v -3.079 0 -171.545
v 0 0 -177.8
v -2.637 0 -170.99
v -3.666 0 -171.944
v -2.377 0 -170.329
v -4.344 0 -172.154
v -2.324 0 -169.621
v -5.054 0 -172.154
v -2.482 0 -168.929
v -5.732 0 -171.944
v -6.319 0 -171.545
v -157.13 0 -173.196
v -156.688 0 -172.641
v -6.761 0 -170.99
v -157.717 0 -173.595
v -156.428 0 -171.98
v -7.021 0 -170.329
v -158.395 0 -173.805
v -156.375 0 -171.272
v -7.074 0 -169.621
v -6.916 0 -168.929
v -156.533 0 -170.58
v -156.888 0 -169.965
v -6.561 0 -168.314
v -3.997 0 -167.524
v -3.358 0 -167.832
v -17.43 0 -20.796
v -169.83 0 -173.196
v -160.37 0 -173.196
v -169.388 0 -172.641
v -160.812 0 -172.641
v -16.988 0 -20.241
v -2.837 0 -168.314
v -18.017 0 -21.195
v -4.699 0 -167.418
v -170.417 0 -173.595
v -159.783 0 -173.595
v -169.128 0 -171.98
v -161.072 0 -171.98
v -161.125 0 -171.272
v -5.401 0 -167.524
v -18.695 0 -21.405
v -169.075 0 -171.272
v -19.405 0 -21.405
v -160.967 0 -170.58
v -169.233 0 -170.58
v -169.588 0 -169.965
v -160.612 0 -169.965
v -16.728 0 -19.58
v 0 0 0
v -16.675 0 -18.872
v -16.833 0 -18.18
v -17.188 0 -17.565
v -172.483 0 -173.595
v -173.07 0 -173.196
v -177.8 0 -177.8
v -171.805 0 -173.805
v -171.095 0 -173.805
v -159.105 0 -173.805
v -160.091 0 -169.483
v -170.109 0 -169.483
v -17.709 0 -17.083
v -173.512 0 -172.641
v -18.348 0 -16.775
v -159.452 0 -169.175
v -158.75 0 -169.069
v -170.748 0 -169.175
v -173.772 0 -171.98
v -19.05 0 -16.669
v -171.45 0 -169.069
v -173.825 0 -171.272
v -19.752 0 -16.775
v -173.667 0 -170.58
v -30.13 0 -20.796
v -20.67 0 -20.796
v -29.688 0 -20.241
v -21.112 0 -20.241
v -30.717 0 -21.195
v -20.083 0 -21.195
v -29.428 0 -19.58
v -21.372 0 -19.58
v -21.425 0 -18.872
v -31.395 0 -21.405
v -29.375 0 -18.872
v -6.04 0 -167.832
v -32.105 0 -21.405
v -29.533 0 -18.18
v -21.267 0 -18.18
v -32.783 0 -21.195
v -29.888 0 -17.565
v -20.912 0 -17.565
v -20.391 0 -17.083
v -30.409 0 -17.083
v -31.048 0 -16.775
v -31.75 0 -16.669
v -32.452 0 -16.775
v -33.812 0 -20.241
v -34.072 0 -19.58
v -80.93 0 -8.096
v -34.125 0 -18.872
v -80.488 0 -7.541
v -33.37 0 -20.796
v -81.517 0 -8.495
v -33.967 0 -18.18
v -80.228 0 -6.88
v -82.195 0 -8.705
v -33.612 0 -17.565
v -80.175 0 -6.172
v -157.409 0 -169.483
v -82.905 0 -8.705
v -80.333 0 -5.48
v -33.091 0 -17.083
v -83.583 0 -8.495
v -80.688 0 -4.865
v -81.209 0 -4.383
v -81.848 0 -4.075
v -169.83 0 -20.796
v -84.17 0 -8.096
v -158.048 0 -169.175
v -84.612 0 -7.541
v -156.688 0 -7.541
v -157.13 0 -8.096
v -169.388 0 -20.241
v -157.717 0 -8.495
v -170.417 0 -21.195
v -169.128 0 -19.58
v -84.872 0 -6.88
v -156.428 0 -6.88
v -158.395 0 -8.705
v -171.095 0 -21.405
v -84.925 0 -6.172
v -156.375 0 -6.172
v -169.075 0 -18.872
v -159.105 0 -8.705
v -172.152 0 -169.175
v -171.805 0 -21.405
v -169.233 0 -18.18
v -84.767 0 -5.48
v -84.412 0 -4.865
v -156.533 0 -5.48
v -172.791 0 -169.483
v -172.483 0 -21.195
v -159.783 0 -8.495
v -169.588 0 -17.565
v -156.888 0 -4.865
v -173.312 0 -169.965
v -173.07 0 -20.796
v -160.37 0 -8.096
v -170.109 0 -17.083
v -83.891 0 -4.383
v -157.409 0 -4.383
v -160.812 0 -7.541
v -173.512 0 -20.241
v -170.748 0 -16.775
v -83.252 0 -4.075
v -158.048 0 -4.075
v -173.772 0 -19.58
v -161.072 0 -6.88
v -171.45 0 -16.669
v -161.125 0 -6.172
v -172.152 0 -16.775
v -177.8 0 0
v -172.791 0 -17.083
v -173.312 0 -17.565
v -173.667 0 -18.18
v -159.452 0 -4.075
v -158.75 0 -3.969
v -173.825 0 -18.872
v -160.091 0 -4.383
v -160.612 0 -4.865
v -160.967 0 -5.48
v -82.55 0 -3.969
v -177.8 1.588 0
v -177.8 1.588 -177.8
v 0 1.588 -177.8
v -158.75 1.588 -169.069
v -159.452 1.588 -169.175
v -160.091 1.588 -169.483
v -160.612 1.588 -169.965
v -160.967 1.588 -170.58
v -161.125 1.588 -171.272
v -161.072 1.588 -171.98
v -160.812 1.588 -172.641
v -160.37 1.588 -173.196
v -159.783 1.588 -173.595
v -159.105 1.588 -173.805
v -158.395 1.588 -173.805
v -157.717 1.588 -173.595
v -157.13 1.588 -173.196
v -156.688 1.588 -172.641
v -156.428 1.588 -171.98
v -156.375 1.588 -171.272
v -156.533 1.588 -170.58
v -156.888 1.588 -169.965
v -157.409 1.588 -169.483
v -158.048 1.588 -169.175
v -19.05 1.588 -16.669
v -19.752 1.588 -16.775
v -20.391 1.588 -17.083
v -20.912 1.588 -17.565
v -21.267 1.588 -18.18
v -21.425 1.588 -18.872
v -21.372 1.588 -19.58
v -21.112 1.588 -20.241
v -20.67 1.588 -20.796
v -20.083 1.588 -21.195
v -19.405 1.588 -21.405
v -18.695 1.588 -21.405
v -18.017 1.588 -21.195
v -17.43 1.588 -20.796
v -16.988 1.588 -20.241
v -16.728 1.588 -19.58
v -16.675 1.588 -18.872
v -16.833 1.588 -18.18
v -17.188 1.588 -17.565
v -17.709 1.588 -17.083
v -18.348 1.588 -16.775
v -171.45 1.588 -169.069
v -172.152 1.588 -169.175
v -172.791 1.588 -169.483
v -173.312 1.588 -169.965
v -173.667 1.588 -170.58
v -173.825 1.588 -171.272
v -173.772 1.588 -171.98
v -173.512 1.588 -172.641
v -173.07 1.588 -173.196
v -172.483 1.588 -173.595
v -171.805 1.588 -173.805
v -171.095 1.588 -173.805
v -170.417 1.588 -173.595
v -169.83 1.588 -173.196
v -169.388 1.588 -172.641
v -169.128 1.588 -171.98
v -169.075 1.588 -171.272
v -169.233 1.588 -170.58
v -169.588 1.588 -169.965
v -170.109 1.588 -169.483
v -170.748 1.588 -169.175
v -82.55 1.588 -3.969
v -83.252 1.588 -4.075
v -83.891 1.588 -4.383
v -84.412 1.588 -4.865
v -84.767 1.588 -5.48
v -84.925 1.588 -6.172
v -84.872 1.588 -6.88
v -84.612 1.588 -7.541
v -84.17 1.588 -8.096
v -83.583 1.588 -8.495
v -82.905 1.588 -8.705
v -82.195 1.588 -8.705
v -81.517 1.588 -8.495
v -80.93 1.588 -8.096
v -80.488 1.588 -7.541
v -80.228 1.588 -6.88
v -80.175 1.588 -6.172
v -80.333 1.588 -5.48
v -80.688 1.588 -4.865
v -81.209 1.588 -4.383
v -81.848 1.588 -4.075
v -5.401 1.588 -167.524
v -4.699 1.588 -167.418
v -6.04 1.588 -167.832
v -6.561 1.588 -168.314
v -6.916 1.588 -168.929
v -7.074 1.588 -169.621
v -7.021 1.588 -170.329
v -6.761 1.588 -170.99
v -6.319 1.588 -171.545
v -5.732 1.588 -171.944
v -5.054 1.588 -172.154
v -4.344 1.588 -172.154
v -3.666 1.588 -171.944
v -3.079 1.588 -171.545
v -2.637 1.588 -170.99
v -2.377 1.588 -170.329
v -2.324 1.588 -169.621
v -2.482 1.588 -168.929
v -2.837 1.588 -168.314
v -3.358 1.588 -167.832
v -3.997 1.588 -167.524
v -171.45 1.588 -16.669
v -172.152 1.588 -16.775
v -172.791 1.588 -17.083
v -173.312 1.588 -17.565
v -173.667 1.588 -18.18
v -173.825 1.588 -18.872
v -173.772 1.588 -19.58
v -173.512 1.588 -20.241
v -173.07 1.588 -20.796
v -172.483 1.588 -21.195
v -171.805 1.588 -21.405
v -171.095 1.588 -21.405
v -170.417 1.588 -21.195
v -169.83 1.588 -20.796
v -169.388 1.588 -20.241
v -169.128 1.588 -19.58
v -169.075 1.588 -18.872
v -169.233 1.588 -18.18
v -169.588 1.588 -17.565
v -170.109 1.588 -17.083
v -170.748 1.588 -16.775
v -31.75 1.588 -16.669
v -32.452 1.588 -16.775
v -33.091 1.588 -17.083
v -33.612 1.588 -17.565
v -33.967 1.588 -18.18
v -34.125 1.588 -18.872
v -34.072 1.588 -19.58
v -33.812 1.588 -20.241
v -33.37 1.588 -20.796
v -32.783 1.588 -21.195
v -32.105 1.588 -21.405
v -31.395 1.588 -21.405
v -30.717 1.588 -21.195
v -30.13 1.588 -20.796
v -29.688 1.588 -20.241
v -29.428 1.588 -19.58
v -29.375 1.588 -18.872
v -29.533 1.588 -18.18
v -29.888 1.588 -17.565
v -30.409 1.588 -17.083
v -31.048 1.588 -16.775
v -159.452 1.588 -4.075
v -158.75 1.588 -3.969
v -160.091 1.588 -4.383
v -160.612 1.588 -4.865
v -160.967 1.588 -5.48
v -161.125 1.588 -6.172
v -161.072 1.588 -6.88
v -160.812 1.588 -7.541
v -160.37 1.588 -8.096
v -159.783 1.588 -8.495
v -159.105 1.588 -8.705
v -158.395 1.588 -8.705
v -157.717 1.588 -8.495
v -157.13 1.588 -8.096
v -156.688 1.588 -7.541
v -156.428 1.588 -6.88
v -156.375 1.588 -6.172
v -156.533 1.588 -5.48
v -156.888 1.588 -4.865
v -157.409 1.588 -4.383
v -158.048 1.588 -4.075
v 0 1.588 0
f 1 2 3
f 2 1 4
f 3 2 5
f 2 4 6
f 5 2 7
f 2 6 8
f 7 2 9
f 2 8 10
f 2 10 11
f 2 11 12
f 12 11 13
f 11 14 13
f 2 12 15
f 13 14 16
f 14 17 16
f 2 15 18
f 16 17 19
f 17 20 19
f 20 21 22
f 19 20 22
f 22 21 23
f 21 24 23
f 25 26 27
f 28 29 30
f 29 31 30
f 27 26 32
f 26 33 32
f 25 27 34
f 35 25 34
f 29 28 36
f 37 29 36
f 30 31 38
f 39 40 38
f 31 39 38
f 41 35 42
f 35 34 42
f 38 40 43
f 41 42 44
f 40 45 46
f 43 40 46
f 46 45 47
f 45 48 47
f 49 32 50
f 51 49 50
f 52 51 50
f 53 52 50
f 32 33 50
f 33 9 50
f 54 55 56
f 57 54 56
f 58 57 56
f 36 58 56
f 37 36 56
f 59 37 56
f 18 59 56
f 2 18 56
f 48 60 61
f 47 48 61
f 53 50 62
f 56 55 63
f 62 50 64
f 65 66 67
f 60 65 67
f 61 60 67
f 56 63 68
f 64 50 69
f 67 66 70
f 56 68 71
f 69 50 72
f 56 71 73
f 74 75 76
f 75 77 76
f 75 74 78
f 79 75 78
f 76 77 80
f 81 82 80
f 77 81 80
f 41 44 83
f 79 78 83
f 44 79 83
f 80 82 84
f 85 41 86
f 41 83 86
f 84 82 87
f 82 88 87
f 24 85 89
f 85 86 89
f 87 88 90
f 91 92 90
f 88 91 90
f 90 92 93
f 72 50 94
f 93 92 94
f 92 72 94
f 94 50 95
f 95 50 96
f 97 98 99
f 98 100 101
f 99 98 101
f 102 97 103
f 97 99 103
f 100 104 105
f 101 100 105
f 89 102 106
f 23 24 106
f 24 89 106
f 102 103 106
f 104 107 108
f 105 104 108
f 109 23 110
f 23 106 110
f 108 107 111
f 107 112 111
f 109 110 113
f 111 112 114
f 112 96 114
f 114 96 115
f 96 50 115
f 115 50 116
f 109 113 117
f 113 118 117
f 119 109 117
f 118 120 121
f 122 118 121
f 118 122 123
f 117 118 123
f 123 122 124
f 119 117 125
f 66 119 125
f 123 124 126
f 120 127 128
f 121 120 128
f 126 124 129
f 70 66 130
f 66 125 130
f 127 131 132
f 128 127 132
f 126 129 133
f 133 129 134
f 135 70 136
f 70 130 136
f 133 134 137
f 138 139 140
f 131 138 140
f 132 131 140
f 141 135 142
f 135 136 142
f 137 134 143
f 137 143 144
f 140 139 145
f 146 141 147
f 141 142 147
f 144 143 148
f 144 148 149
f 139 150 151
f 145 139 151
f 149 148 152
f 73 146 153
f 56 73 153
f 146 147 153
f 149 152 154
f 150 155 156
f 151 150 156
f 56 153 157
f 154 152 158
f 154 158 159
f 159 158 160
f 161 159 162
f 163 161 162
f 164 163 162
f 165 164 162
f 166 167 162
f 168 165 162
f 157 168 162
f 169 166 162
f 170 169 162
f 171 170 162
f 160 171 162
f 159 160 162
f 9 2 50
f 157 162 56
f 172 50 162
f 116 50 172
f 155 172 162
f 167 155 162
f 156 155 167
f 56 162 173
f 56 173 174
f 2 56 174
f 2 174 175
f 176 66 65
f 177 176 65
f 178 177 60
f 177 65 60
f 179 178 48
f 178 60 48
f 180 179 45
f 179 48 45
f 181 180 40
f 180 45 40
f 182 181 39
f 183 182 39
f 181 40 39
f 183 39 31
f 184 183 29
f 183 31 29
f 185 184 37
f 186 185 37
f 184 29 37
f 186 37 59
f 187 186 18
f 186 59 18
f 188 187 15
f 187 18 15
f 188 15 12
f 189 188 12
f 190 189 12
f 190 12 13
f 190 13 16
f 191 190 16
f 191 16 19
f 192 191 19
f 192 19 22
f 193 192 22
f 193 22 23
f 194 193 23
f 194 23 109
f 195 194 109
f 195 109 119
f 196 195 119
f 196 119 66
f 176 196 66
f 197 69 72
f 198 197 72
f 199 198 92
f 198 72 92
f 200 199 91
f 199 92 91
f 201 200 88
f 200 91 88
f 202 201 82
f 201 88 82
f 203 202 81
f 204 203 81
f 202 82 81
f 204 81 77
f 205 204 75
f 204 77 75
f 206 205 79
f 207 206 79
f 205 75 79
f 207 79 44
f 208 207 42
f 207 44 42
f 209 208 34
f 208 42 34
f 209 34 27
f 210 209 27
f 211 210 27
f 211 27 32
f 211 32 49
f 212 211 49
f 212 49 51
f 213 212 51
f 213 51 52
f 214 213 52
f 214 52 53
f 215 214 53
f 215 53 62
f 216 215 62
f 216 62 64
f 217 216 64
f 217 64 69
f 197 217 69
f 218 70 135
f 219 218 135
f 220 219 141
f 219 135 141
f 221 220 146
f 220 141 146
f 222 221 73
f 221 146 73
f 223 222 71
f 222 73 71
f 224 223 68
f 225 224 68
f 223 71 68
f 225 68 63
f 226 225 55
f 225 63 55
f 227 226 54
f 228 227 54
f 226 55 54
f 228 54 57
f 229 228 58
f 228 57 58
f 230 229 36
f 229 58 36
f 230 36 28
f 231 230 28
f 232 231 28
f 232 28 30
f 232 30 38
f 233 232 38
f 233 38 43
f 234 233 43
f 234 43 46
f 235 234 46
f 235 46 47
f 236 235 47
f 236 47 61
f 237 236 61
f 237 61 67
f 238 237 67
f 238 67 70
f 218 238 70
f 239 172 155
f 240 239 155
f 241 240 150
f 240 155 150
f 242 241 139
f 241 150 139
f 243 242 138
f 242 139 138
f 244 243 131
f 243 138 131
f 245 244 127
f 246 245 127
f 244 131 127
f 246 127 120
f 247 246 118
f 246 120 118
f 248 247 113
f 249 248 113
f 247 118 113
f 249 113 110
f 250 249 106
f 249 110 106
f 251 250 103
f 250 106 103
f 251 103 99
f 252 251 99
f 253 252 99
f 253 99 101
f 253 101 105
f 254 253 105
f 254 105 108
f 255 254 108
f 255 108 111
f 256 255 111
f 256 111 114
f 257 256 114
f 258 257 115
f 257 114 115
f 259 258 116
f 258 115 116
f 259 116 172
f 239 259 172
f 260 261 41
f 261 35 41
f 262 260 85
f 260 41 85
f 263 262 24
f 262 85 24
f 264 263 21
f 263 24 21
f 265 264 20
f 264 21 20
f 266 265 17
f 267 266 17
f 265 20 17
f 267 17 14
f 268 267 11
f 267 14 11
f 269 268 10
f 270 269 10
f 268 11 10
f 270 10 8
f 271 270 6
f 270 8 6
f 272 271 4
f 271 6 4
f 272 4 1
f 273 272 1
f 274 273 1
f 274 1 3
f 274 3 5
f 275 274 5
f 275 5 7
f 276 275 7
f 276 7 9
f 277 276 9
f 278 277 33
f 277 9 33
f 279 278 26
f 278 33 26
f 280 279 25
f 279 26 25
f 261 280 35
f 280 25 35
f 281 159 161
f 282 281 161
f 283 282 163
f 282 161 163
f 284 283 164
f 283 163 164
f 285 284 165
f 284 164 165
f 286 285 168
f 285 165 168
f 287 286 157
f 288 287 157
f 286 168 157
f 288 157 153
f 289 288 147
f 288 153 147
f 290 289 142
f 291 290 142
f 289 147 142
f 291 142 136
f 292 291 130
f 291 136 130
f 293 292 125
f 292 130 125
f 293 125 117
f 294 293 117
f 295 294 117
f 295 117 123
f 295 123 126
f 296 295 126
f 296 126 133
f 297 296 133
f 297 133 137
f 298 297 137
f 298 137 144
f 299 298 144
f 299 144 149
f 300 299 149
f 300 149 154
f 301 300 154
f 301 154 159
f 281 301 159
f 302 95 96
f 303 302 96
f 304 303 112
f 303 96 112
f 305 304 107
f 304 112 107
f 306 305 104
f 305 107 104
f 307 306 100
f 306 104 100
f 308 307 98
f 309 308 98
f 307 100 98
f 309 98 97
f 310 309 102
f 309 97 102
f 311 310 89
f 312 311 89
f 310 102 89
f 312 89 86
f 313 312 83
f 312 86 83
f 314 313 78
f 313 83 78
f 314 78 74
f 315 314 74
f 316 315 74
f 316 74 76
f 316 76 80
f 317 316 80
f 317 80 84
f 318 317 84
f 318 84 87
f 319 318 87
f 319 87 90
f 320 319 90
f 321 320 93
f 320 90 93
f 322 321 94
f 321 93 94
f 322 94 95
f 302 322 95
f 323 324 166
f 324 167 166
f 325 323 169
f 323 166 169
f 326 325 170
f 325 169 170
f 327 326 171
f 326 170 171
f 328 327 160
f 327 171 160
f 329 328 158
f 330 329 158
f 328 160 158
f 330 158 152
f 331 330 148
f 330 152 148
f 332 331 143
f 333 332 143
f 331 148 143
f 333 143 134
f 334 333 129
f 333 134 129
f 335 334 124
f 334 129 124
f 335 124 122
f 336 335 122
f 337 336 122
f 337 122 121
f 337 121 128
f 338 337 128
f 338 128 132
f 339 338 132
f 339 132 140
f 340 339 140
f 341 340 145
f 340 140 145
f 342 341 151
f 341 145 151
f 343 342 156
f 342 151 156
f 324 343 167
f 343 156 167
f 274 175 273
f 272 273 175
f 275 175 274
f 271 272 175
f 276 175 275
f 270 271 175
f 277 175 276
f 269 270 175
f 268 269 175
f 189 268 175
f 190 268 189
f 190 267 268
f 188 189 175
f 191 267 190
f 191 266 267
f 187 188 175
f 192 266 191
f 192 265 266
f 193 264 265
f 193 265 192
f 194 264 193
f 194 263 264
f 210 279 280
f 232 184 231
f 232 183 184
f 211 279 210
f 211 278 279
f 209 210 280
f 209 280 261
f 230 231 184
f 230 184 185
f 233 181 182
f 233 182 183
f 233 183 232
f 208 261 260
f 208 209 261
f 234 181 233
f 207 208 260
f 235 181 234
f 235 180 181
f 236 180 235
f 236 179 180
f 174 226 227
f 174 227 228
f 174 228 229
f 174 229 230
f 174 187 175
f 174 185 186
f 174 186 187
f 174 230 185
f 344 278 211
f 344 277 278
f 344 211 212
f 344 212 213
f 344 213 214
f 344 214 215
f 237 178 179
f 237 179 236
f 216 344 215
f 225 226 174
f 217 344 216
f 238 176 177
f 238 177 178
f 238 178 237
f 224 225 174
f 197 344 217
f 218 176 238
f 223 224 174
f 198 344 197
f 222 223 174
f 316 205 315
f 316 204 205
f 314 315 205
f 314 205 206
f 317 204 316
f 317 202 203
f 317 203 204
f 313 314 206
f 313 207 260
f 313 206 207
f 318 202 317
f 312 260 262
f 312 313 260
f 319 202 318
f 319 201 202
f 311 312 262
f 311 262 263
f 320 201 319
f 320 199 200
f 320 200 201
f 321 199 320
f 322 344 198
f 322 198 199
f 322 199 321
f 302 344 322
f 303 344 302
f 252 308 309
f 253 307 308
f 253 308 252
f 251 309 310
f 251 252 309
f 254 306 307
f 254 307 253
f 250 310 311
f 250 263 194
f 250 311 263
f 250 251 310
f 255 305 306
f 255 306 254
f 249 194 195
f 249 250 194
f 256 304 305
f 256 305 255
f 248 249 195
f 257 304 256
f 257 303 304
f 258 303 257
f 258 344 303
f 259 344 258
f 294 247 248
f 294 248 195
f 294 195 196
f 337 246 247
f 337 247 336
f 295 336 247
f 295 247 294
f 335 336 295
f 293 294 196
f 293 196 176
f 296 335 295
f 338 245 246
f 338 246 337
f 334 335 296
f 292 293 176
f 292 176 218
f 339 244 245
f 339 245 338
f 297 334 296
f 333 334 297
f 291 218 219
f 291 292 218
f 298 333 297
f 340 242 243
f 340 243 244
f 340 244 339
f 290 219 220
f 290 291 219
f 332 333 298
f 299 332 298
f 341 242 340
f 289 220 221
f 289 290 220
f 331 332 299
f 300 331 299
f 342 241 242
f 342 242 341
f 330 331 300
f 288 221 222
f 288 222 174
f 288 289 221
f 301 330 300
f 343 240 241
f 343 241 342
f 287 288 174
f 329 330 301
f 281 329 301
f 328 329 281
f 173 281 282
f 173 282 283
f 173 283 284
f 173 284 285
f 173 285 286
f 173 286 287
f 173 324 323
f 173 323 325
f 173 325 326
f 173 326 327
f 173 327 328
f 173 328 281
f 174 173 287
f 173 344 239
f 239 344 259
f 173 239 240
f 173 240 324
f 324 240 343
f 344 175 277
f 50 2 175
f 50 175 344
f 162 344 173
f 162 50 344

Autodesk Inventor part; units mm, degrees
ref_plane "YZ Plane" through (0, 0, 0) normal (1, 0, 0) x (0, 1, 0)
ref_plane "XZ Plane" through (0, 0, 0) normal (0, 1, 0) x (-1, 0, 0)
ref_plane "XY Plane" through (0, 0, 0) normal (0, 0, 1) x (1, 0, 0)
sketch "Sketch1" plane through (0, 0, 0) normal (0, 1, 0) x (-1, 0, 0)
  line L0 (0, 0) -> (177.8, 0)
  line L1 (177.8, 0) -> (177.8, -177.8)
  line L2 (177.8, -177.8) -> (0, -177.8)
  line L3 (0, -177.8) -> (0, 0)
  dimension "d0" = 177.8
  dimension "d1" = 177.8
extrude "Extrusion1" add sketch "Sketch1" along normal blind 1.5875
sketch "Sketch2" plane through (0, 1.5875, 0) normal (0, 1, 0) x (1, 0, 0)
  line L0 (-177.8, 177.8) -> (-177.8, 0) projected
  line L1 (-177.8, 177.8) -> (-177.8, 165.1)
  line L2 (-177.8, 165.1) -> (-165.1, 177.8)
  line L3 (0, 177.8) -> (-177.8, 177.8) projected
  line L4 (-177.8, 177.8) -> (-171.45, 171.45)
  line L5 (-171.45, 171.45) -> (-158.75, 171.45)
  line L6 (-177.8, 0) -> (-165.1, 0)
  line L7 (-177.8, 0) -> (0, 0) projected
  line L8 (0, 177.8) -> (-12.7, 177.8)
  line L9 (0, 0) -> (0, 177.8) projected
  line L10 (0, 0) -> (0, 12.7)
  line L11 (0, 12.7) -> (-12.7, 0)
  line L12 (0, 0) -> (-6.35, 6.35)
  line L13 (-6.35, 6.35) -> (-6.35, 19.05)
  line L14 (-6.35, 19.05) -> (-19.05, 19.05)
  line L15 (-19.05, 19.05) -> (-31.75, 19.05)
  line L16 (-12.7, 177.8) -> (0, 165.1)
  line L17 (0, 177.8) -> (-6.35, 171.45)
  line L18 (-165.1, 0) -> (-177.8, 12.7)
  line L19 (-177.8, 0) -> (-171.45, 6.35)
  line L20 (-171.45, 6.35) -> (-171.45, 19.05)
  line L21 (-171.45, 6.35) -> (-158.75, 6.35)
  line L22 (-6.35, 171.45) -> (-6.35, 169.799)
  line L23 (-6.35, 169.799) -> (-4.699, 169.799)
  dimension "d4" = 12.7
  dimension "d5" = 45
  dimension "d6" = 12.7
  dimension "d7" = 12.7
  dimension "d12" = 12.7
  dimension "d28" = 1.651
hole "Hole2" at (-171.45, 1.5875, -171.45) at (-158.75, 1.5875, -171.45) at (-19.05, 1.5875, -19.05) at (-31.75, 1.5875, -19.05) at (-171.45, 1.5875, -19.05) at (-158.75, 1.5875, -6.35) at (-4.699, 1.5875, -169.799) direction (0, -1, 0) diameter 4.7625 end through all
sketch "Sketch3" plane through (0, 1.5875, 0) normal (0, 1, 0) x (1, 0, 0)
  line L0 (0, 0) -> (0, 12.7)
  line L1 (0, 0) -> (0, 177.8) projected
  line L2 (0, 12.7) -> (-12.7, 0)
  line L3 (-177.8, 0) -> (0, 0) projected
  line L4 (-12.7, 0) -> (0, 0)
  line L5 (0, 0) -> (-6.35, 6.35)
  line L6 (-6.35, 6.35) -> (-82.55, 6.35)
  dimension "d29" = 12.7
  dimension "d30" = 45
  dimension "d31" = 76.2
hole "Hole3" at (-82.55, 1.5875, -6.35) direction (0, -1, 0) diameter 4.7625 end through all
properties part number "shoot" material "ABS Plastic"
